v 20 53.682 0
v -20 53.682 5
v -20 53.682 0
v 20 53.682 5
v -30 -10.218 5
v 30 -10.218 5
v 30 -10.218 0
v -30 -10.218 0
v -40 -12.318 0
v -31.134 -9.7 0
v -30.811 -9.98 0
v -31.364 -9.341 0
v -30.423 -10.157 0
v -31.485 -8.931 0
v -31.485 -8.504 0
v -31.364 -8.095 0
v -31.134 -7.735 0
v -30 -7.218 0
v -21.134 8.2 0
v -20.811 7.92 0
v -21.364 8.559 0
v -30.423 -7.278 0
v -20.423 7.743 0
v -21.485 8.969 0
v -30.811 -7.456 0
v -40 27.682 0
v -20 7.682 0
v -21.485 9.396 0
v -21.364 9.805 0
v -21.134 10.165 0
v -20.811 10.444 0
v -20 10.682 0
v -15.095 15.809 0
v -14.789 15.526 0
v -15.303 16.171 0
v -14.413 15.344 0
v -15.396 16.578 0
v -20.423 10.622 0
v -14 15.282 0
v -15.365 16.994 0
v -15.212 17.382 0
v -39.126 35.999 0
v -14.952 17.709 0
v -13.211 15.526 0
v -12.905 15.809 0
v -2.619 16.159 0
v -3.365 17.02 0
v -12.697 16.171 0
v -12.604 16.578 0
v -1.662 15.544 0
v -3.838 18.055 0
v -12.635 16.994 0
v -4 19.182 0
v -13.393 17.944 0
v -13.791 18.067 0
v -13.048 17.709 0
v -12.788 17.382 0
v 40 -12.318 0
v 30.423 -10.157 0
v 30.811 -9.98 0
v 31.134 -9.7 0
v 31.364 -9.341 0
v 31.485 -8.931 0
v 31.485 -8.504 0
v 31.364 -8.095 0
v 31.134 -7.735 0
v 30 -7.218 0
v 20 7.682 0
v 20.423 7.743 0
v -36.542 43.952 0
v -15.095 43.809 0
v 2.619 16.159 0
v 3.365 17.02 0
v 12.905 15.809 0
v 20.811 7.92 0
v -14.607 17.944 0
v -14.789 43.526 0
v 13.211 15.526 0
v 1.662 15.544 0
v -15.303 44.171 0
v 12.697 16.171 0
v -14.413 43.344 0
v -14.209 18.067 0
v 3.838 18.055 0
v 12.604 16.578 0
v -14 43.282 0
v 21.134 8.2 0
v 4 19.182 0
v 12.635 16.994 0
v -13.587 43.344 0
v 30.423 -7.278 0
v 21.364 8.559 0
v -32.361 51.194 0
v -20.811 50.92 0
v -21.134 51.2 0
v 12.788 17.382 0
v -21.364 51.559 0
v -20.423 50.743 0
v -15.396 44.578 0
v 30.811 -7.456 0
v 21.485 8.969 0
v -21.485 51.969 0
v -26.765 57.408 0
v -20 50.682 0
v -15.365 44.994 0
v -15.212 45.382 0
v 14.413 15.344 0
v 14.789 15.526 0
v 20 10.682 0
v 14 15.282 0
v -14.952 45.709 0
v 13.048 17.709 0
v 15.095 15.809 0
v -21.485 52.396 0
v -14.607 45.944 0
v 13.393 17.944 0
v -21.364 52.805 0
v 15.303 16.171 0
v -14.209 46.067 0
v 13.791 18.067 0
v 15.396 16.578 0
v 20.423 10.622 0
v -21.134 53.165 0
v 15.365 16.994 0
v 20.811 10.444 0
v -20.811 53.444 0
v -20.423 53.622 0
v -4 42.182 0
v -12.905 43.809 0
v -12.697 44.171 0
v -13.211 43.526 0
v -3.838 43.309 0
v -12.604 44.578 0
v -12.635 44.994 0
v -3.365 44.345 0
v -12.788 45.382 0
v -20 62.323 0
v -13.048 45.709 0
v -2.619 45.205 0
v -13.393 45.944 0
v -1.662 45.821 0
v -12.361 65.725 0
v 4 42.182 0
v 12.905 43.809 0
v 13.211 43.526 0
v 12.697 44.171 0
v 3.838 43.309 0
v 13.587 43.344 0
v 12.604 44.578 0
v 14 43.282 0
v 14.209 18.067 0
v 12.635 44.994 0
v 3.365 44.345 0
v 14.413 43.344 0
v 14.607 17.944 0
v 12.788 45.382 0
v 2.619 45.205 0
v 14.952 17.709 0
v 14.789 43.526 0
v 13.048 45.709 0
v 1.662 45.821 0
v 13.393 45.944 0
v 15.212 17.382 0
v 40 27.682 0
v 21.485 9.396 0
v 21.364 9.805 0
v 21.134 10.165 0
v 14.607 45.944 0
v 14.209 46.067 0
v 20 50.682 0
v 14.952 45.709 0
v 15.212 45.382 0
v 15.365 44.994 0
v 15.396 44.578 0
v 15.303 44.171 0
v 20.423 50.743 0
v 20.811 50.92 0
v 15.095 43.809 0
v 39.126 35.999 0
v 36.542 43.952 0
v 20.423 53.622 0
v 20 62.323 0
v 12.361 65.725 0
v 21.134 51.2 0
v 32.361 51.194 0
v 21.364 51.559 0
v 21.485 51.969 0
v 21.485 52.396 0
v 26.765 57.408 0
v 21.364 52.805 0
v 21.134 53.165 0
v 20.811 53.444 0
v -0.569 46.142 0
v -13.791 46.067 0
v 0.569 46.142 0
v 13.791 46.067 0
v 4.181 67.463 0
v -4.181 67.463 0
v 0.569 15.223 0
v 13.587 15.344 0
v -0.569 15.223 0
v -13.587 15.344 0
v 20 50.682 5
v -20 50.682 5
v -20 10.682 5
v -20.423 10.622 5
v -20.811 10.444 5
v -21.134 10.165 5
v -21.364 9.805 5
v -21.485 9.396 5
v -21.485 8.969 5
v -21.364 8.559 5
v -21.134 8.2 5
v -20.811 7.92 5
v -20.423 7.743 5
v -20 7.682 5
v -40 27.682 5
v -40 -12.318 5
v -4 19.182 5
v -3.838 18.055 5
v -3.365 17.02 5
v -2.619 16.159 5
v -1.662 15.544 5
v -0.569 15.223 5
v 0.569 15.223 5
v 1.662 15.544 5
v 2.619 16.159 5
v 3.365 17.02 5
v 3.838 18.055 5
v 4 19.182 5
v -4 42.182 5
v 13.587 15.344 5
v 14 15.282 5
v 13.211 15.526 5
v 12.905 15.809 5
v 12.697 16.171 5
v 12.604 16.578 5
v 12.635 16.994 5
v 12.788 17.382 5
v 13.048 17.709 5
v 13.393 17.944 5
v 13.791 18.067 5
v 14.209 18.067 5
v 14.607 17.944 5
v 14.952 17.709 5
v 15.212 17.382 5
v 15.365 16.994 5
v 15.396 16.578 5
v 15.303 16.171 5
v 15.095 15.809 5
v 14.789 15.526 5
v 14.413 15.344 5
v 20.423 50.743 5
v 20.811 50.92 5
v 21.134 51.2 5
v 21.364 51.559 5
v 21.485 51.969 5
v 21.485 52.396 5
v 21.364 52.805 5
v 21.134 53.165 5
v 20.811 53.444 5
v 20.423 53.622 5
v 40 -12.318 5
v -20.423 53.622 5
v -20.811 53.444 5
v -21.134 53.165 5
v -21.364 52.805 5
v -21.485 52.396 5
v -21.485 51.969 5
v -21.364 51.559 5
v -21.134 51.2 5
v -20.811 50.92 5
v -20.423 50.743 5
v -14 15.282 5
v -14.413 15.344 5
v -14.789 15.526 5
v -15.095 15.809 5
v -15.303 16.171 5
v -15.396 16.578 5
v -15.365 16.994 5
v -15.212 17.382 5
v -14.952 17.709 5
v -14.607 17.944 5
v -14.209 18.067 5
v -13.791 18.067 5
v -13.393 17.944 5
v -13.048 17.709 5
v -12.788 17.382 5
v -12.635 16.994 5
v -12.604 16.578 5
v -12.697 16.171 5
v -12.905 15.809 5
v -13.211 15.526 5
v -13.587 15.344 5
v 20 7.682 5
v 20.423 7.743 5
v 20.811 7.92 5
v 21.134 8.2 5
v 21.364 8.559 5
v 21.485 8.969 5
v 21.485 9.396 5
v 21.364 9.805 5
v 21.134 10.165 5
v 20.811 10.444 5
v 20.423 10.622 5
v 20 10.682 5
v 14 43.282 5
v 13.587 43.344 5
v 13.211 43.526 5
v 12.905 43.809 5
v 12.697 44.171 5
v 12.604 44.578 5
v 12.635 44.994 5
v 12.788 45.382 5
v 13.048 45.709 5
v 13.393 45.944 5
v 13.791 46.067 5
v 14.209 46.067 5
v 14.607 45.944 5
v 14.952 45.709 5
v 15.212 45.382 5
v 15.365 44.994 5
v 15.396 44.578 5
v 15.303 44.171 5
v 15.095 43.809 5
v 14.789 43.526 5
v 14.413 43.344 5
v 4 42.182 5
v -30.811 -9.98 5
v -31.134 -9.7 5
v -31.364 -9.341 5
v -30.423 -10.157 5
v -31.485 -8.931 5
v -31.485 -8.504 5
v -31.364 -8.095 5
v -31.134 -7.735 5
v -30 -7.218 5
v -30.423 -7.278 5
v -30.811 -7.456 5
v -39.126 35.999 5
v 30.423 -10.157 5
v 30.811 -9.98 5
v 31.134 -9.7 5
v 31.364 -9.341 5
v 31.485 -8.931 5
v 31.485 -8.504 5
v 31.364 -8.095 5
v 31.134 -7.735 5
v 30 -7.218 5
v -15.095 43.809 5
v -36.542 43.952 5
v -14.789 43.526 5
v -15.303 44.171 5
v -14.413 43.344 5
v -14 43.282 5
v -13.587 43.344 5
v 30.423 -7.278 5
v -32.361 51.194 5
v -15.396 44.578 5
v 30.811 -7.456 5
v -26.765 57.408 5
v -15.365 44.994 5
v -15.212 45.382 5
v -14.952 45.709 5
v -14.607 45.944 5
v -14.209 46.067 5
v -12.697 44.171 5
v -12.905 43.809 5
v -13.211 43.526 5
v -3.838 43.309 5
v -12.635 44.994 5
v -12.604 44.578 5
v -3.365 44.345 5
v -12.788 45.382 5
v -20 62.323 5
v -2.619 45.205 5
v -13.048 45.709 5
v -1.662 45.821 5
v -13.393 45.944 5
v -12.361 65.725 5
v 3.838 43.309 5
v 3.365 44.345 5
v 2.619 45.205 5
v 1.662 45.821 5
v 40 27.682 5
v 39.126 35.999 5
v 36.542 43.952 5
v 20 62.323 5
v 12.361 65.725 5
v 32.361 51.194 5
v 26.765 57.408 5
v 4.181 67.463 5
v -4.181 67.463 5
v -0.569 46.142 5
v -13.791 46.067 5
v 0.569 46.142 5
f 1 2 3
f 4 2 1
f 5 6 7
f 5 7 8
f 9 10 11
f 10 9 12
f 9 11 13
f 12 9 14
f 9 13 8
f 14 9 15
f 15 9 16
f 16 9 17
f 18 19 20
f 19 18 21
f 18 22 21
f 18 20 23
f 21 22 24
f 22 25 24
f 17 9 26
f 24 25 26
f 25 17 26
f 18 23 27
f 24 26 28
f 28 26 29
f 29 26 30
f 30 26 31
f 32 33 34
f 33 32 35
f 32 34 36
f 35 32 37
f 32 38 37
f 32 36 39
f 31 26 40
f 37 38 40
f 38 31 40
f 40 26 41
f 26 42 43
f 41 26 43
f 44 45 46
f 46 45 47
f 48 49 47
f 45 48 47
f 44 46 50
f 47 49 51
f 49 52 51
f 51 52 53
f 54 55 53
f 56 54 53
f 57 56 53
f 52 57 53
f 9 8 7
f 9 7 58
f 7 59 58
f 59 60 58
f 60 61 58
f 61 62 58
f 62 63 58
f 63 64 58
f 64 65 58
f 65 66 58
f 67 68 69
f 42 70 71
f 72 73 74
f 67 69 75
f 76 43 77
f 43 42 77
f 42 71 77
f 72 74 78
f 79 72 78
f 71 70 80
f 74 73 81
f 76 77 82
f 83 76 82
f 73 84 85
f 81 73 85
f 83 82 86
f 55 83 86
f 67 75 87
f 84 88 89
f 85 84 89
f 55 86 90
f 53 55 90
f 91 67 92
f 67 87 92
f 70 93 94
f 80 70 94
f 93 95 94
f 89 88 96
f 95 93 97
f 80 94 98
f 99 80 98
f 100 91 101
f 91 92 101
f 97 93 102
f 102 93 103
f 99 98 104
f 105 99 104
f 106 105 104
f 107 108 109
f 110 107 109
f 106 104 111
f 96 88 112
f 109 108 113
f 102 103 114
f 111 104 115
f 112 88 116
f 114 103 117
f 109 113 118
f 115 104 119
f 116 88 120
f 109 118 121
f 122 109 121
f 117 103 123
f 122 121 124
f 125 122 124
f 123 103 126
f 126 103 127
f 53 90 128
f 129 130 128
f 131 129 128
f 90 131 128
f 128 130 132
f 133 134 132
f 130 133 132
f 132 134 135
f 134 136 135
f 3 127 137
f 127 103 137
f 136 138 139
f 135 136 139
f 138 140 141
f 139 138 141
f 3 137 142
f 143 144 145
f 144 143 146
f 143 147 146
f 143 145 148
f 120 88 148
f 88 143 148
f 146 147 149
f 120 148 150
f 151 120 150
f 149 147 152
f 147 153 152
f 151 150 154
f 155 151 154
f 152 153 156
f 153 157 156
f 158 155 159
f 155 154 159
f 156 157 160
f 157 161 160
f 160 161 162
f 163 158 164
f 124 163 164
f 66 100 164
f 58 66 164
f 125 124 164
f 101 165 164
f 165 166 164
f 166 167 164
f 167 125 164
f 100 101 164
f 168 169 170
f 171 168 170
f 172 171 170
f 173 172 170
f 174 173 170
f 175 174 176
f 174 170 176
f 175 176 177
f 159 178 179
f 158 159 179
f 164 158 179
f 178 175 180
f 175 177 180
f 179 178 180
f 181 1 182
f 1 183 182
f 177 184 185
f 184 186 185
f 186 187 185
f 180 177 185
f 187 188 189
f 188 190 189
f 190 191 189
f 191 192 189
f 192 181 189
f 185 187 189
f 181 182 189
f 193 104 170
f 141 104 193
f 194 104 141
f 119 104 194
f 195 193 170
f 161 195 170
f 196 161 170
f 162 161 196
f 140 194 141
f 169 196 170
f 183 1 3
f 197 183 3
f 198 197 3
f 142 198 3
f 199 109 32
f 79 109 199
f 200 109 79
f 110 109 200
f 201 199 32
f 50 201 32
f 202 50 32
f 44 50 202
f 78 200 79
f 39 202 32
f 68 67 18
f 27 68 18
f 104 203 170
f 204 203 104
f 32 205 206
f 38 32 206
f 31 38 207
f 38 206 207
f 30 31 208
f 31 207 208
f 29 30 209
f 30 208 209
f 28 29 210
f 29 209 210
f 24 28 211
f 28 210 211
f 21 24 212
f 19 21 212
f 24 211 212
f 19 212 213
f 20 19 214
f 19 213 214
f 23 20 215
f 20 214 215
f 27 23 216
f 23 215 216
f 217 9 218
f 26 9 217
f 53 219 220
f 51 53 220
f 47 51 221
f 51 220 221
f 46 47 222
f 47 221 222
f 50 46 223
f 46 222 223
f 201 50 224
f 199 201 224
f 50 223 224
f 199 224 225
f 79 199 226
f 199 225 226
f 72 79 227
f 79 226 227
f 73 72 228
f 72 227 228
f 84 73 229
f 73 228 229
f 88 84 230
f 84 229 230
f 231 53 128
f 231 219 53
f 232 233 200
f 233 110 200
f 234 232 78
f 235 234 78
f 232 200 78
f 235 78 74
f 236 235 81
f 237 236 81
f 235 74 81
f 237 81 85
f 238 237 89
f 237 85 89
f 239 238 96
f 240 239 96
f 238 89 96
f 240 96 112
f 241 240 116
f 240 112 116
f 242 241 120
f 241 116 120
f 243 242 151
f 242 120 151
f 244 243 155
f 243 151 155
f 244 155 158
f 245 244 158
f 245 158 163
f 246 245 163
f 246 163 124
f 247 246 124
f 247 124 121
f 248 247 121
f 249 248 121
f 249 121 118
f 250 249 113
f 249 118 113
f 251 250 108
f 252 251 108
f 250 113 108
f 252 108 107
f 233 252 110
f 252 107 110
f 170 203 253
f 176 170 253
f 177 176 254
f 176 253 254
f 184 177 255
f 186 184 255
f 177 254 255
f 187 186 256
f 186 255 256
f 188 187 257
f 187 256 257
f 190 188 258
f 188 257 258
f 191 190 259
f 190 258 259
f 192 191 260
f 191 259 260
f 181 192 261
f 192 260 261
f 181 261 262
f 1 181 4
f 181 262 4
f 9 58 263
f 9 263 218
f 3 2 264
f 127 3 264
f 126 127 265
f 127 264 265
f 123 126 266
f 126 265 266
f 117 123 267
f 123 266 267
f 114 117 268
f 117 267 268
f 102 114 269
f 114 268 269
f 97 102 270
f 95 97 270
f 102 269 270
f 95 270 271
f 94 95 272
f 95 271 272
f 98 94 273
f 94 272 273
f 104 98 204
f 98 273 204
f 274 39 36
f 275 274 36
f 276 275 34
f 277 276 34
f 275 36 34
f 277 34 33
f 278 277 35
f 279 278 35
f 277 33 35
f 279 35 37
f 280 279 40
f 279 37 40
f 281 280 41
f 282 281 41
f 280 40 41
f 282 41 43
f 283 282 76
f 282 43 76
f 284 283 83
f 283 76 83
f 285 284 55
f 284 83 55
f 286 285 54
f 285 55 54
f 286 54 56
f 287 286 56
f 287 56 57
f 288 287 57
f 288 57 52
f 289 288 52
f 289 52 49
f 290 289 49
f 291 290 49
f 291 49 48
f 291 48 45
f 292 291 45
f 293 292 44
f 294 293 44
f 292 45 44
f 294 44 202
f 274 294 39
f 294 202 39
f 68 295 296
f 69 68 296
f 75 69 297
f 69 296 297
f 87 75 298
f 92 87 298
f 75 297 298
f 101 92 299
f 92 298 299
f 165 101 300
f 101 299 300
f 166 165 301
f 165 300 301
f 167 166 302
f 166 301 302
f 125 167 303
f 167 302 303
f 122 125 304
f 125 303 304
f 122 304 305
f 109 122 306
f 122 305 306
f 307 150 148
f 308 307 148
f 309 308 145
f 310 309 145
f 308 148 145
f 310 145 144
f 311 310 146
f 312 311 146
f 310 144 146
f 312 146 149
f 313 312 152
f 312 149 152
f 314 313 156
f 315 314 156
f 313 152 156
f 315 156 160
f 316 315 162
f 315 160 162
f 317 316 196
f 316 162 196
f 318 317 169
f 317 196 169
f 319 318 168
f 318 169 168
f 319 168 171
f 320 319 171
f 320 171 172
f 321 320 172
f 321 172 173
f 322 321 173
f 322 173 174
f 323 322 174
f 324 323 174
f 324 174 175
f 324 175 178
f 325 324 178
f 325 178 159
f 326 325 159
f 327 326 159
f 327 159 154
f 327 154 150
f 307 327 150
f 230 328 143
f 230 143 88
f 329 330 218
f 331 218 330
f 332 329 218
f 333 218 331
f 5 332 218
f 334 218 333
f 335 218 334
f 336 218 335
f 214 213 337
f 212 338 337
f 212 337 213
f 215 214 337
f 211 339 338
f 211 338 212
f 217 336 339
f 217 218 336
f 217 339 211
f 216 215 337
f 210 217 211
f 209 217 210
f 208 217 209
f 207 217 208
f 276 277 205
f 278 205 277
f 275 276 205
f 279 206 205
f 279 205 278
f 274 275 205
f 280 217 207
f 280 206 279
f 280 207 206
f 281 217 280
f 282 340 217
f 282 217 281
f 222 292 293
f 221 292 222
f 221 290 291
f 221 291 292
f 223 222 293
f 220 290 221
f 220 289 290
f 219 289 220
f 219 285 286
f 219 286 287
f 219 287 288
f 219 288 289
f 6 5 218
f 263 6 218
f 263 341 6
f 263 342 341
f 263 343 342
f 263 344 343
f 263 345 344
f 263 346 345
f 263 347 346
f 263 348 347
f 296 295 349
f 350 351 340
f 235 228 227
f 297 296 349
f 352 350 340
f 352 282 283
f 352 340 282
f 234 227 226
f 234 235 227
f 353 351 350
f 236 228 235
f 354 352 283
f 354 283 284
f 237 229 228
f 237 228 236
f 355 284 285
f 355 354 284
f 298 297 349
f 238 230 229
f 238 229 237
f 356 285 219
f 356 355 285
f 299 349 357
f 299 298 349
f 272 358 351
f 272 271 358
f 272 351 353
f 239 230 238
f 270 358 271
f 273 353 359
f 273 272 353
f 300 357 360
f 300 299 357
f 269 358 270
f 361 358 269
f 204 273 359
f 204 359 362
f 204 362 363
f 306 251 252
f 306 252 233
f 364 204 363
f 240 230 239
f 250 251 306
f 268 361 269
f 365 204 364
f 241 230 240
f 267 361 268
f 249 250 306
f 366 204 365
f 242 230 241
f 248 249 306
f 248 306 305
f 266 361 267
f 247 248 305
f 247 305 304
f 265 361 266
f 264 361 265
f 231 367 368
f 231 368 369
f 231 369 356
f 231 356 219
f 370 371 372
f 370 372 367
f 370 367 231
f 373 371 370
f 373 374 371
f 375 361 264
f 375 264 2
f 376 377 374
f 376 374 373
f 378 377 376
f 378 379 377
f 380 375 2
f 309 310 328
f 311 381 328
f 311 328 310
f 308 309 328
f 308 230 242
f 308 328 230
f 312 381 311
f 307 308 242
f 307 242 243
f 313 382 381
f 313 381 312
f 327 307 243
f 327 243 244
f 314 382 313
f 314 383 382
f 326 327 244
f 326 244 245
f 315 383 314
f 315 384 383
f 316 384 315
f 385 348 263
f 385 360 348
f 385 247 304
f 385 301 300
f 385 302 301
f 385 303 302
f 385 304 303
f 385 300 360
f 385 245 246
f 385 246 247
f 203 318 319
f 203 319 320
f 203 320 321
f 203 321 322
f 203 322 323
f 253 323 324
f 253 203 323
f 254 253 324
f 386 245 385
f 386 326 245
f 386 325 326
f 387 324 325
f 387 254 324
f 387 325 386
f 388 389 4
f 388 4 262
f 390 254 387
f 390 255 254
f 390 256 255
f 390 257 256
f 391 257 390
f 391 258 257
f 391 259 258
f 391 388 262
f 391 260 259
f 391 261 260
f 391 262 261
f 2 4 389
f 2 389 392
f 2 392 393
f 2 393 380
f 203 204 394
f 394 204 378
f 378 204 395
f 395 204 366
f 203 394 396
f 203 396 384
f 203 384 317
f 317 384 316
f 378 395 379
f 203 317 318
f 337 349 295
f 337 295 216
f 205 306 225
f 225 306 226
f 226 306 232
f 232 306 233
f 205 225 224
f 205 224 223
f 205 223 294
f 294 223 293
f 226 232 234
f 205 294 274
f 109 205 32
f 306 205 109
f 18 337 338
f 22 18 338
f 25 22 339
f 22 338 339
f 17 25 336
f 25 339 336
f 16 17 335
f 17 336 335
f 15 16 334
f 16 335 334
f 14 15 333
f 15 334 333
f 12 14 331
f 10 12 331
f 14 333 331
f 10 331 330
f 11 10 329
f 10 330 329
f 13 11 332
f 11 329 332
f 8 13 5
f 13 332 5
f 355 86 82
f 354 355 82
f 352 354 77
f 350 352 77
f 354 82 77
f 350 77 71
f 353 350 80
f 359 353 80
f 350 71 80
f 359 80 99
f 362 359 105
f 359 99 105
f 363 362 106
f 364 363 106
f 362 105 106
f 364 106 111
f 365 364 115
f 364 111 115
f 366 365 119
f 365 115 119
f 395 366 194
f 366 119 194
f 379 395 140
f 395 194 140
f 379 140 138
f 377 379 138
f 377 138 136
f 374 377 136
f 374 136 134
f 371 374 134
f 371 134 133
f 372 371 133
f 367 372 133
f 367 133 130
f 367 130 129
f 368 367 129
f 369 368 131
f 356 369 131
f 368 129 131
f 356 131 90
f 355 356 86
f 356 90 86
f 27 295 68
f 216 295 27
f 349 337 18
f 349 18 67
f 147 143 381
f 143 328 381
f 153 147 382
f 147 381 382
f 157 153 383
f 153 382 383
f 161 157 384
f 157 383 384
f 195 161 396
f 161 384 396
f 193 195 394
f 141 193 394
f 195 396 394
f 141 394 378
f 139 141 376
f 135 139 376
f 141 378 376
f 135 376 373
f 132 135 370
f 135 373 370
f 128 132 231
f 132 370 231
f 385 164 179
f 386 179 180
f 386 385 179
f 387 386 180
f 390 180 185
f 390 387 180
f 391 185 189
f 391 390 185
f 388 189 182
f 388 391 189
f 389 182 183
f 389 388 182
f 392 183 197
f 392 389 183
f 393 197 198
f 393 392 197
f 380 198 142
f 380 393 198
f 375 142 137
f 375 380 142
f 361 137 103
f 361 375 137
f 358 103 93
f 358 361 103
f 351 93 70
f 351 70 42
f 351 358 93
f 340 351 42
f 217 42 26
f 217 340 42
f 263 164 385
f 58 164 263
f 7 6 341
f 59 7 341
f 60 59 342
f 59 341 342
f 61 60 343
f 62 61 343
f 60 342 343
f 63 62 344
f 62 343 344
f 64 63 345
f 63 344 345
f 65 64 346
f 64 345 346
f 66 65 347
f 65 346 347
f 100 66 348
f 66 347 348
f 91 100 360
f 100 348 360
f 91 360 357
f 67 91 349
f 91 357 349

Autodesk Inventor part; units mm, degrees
ref_plane "YZ Plane" through (0, 0, 0) normal (1, 0, 0) x (0, 1, 0)
ref_plane "XZ Plane" through (0, 0, 0) normal (0, 1, 0) x (-1, 0, 0)
ref_plane "XY Plane" through (0, 0, 0) normal (0, 0, 1) x (1, 0, 0)
sketch "スケッチ1" plane through (0, 0, 0) normal (0, 0, 1) x (1, 0, 0)
  line L0 (-40, 67.6823) -> (40, 67.6823)
  line L1 (40, 67.6823) -> (40, -12.3177)
  line L2 (40, -12.3177) -> (-40, -12.3177)
  line L3 (-40, -12.3177) -> (-40, 67.6823)
  point P0 (0, 0)
  dimension "d0" = 80
  dimension "d1" = 40
  dimension "d2" = 80
extrude "押し出し1" add sketch "スケッチ1" along normal blind 5
sketch "スケッチ5" plane through (0, 0, 5) normal (0, 0, 1) x (1, 0, 0)
  line L0 (-40, -7.3177) -> (40, -7.3177) projected
  line L1 (40, 67.6823) -> (40, -12.3177) projected
  line L2 (-40, 67.6823) -> (40, 67.6823) projected
  line L3 (-40, -12.3177) -> (-40, 67.6823) projected
  arc A0 (40, 27.6823) -> (-40, 27.6823) centre (0, 27.6823) ccw
  point P0 (0, 0)
  dimension "d21" = 40
  dimension "d22" = 40
  dimension "d23" = 80
extrude "押し出し4" cut sketch "スケッチ5" against normal through all contours L3 L2 A0 | A0 L2 L1
sketch "スケッチ6" plane through (0, 0, 5) normal (0, 0, 1) x (1, 0, 0)
  arc A0 (40, 27.6823) -> (-40, 27.6823) centre (0, 27.6823) ccw projected
  point P0 (0, 0)
hole "Hole2" at (0, 27.6823, 5) direction (0, 0, -1) diameter 8 end through all
sketch "スケッチ8" plane through (0, 0, 5) normal (0, 0, 1) x (1, 0, 0)
  circle A0 centre (0, 27.6823) radius 4 projected
  line L0 (-20, 10.6823) -> (20, 10.6823)
  line L1 (20, 10.6823) -> (20, 7.6823)
  line L2 (20, 7.6823) -> (-20, 7.6823)
  line L3 (-20, 7.6823) -> (-20, 10.6823)
  circle A1 centre (-20, 9.1823) radius 1.5
  circle A2 centre (20, 9.1823) radius 1.5
  line L4 (40, -12.3177) -> (-40, -12.3177) projected
  line L5 (-20, 53.6823) -> (20, 53.6823)
  line L6 (20, 53.6823) -> (20, 50.6823)
  line L7 (20, 50.6823) -> (-20, 50.6823)
  line L8 (-20, 50.6823) -> (-20, 53.6823)
  circle A3 centre (-20, 52.1823) radius 1.5
  circle A4 centre (20, 52.1823) radius 1.5
  point P0 (0, 0)
  dimension "d54" = 3
  dimension "d55" = 20
  dimension "d56" = 40
  dimension "d65" = 20
  dimension "d87" = 40
  dimension "d88" = 20
  dimension "d89" = 3
  dimension "d91" = 40
extrude "押し出し5" cut sketch "スケッチ8" against normal through all contours A1 L3 | L0 A2 L2 A1 | L3 A1 | A2 L1 | L1 A2 | A3 L8 | L5 A4 L7 A3 | L8 A3 | A4 L6 | L6 A4
sketch "スケッチ9" plane through (0, 0, 5) normal (0, 0, 1) x (1, 0, 0)
  line L0 (-40, -12.3177) -> (-40, 27.6823) projected
  line L1 (40, -12.3177) -> (-40, -12.3177) projected
  line L2 (40, 27.6823) -> (40, -12.3177) projected
  line L3 (-30, -7.2177) -> (30, -7.2177)
  line L4 (30, -7.2177) -> (30, -10.2177)
  line L5 (30, -10.2177) -> (-30, -10.2177)
  line L6 (-30, -10.2177) -> (-30, -7.2177)
  circle A0 centre (-30, -8.7177) radius 1.5
  circle A1 centre (30, -8.7177) radius 1.5
  point P0 (0, 0)
  dimension "d59" = 3
  dimension "d60" = 10
  dimension "d61" = 10
  dimension "d62" = 5.1
extrude "押し出し6" cut sketch "スケッチ9" against normal through all
sketch "スケッチ11" plane through (0, 0, 5) normal (0, 0, 1) x (1, 0, 0)
  arc A0 (20, 50.6823) -> (20, 53.6823) centre (20, 52.1823) ccw projected
  line L0 (20, 50.6823) -> (-20, 50.6823) projected
  line L1 (-20, 10.6823) -> (20, 10.6823) projected
  arc A1 (-20, 10.6823) -> (-20, 7.6823) centre (-20, 9.1823) ccw projected
  point P0 (0, 0)
  point P1 (-14, 44.6823)
  point P2 (-14, 16.6823)
  point P3 (14, 16.6823)
  point P4 (14, 44.6823)
  dimension "d92" = 6
  dimension "d93" = 6
  dimension "d94" = 6
  dimension "d95" = 6
  dimension "d96" = 6
  dimension "d97" = 6
  dimension "d98" = 6
  dimension "d99" = 6
hole "Hole5" at (-14, 44.6823, 5) at (-14, 16.6823, 5) at (14, 16.6823, 5) at (14, 44.6823, 5) direction (0, 0, -1) diameter 2.8 depth 8 tip angle 118
sketch "スケッチ12" plane through (0, 0, 5) normal (0, 0, 1) x (1, 0, 0)
  circle A0 centre (0, 27.6823) radius 4 projected
  line L0 (-4, 42.1823) -> (4, 42.1823)
  line L1 (4, 42.1823) -> (4, 19.1823)
  line L2 (4, 19.1823) -> (-4, 19.1823)
  line L3 (-4, 19.1823) -> (-4, 42.1823)
  circle A1 centre (0, 42.1823) radius 4
  circle A2 centre (0, 19.1823) radius 4
  circle A3 centre (14, 16.6823) radius 1.4 projected
  circle A4 centre (-14, 44.6823) radius 1.4 projected
  point P0 (0, 0)
  dimension "d109" = 2.5
  dimension "d110" = 2.5
extrude "押し出し7" cut sketch "スケッチ12" against normal blind 10 contours L1 A2 L3 A0 | A0 L3 A1 L1 | A1 L0 | L0 A1 | A2 L2 | L2 A2
equation "\"d1\" = 0.5 * d0"
equation "\"d2\" = d0"
equation "\"d21\" = d22"
equation "\"d55\" = 0.5 * d56"
equation "\"d87\" = d56"
equation "\"d88\" = d55"
equation "\"d89\" = d54"
equation "\"d61\" = d60"
equation "\"d93\" = d92"
equation "\"d94\" = d92"
equation "\"d95\" = d92"
equation "\"d96\" = d92"
equation "\"d97\" = d92"
equation "\"d98\" = d92"
equation "\"d99\" = d92"
equation "\"d110\" = d109"
properties part number "JointB1"
